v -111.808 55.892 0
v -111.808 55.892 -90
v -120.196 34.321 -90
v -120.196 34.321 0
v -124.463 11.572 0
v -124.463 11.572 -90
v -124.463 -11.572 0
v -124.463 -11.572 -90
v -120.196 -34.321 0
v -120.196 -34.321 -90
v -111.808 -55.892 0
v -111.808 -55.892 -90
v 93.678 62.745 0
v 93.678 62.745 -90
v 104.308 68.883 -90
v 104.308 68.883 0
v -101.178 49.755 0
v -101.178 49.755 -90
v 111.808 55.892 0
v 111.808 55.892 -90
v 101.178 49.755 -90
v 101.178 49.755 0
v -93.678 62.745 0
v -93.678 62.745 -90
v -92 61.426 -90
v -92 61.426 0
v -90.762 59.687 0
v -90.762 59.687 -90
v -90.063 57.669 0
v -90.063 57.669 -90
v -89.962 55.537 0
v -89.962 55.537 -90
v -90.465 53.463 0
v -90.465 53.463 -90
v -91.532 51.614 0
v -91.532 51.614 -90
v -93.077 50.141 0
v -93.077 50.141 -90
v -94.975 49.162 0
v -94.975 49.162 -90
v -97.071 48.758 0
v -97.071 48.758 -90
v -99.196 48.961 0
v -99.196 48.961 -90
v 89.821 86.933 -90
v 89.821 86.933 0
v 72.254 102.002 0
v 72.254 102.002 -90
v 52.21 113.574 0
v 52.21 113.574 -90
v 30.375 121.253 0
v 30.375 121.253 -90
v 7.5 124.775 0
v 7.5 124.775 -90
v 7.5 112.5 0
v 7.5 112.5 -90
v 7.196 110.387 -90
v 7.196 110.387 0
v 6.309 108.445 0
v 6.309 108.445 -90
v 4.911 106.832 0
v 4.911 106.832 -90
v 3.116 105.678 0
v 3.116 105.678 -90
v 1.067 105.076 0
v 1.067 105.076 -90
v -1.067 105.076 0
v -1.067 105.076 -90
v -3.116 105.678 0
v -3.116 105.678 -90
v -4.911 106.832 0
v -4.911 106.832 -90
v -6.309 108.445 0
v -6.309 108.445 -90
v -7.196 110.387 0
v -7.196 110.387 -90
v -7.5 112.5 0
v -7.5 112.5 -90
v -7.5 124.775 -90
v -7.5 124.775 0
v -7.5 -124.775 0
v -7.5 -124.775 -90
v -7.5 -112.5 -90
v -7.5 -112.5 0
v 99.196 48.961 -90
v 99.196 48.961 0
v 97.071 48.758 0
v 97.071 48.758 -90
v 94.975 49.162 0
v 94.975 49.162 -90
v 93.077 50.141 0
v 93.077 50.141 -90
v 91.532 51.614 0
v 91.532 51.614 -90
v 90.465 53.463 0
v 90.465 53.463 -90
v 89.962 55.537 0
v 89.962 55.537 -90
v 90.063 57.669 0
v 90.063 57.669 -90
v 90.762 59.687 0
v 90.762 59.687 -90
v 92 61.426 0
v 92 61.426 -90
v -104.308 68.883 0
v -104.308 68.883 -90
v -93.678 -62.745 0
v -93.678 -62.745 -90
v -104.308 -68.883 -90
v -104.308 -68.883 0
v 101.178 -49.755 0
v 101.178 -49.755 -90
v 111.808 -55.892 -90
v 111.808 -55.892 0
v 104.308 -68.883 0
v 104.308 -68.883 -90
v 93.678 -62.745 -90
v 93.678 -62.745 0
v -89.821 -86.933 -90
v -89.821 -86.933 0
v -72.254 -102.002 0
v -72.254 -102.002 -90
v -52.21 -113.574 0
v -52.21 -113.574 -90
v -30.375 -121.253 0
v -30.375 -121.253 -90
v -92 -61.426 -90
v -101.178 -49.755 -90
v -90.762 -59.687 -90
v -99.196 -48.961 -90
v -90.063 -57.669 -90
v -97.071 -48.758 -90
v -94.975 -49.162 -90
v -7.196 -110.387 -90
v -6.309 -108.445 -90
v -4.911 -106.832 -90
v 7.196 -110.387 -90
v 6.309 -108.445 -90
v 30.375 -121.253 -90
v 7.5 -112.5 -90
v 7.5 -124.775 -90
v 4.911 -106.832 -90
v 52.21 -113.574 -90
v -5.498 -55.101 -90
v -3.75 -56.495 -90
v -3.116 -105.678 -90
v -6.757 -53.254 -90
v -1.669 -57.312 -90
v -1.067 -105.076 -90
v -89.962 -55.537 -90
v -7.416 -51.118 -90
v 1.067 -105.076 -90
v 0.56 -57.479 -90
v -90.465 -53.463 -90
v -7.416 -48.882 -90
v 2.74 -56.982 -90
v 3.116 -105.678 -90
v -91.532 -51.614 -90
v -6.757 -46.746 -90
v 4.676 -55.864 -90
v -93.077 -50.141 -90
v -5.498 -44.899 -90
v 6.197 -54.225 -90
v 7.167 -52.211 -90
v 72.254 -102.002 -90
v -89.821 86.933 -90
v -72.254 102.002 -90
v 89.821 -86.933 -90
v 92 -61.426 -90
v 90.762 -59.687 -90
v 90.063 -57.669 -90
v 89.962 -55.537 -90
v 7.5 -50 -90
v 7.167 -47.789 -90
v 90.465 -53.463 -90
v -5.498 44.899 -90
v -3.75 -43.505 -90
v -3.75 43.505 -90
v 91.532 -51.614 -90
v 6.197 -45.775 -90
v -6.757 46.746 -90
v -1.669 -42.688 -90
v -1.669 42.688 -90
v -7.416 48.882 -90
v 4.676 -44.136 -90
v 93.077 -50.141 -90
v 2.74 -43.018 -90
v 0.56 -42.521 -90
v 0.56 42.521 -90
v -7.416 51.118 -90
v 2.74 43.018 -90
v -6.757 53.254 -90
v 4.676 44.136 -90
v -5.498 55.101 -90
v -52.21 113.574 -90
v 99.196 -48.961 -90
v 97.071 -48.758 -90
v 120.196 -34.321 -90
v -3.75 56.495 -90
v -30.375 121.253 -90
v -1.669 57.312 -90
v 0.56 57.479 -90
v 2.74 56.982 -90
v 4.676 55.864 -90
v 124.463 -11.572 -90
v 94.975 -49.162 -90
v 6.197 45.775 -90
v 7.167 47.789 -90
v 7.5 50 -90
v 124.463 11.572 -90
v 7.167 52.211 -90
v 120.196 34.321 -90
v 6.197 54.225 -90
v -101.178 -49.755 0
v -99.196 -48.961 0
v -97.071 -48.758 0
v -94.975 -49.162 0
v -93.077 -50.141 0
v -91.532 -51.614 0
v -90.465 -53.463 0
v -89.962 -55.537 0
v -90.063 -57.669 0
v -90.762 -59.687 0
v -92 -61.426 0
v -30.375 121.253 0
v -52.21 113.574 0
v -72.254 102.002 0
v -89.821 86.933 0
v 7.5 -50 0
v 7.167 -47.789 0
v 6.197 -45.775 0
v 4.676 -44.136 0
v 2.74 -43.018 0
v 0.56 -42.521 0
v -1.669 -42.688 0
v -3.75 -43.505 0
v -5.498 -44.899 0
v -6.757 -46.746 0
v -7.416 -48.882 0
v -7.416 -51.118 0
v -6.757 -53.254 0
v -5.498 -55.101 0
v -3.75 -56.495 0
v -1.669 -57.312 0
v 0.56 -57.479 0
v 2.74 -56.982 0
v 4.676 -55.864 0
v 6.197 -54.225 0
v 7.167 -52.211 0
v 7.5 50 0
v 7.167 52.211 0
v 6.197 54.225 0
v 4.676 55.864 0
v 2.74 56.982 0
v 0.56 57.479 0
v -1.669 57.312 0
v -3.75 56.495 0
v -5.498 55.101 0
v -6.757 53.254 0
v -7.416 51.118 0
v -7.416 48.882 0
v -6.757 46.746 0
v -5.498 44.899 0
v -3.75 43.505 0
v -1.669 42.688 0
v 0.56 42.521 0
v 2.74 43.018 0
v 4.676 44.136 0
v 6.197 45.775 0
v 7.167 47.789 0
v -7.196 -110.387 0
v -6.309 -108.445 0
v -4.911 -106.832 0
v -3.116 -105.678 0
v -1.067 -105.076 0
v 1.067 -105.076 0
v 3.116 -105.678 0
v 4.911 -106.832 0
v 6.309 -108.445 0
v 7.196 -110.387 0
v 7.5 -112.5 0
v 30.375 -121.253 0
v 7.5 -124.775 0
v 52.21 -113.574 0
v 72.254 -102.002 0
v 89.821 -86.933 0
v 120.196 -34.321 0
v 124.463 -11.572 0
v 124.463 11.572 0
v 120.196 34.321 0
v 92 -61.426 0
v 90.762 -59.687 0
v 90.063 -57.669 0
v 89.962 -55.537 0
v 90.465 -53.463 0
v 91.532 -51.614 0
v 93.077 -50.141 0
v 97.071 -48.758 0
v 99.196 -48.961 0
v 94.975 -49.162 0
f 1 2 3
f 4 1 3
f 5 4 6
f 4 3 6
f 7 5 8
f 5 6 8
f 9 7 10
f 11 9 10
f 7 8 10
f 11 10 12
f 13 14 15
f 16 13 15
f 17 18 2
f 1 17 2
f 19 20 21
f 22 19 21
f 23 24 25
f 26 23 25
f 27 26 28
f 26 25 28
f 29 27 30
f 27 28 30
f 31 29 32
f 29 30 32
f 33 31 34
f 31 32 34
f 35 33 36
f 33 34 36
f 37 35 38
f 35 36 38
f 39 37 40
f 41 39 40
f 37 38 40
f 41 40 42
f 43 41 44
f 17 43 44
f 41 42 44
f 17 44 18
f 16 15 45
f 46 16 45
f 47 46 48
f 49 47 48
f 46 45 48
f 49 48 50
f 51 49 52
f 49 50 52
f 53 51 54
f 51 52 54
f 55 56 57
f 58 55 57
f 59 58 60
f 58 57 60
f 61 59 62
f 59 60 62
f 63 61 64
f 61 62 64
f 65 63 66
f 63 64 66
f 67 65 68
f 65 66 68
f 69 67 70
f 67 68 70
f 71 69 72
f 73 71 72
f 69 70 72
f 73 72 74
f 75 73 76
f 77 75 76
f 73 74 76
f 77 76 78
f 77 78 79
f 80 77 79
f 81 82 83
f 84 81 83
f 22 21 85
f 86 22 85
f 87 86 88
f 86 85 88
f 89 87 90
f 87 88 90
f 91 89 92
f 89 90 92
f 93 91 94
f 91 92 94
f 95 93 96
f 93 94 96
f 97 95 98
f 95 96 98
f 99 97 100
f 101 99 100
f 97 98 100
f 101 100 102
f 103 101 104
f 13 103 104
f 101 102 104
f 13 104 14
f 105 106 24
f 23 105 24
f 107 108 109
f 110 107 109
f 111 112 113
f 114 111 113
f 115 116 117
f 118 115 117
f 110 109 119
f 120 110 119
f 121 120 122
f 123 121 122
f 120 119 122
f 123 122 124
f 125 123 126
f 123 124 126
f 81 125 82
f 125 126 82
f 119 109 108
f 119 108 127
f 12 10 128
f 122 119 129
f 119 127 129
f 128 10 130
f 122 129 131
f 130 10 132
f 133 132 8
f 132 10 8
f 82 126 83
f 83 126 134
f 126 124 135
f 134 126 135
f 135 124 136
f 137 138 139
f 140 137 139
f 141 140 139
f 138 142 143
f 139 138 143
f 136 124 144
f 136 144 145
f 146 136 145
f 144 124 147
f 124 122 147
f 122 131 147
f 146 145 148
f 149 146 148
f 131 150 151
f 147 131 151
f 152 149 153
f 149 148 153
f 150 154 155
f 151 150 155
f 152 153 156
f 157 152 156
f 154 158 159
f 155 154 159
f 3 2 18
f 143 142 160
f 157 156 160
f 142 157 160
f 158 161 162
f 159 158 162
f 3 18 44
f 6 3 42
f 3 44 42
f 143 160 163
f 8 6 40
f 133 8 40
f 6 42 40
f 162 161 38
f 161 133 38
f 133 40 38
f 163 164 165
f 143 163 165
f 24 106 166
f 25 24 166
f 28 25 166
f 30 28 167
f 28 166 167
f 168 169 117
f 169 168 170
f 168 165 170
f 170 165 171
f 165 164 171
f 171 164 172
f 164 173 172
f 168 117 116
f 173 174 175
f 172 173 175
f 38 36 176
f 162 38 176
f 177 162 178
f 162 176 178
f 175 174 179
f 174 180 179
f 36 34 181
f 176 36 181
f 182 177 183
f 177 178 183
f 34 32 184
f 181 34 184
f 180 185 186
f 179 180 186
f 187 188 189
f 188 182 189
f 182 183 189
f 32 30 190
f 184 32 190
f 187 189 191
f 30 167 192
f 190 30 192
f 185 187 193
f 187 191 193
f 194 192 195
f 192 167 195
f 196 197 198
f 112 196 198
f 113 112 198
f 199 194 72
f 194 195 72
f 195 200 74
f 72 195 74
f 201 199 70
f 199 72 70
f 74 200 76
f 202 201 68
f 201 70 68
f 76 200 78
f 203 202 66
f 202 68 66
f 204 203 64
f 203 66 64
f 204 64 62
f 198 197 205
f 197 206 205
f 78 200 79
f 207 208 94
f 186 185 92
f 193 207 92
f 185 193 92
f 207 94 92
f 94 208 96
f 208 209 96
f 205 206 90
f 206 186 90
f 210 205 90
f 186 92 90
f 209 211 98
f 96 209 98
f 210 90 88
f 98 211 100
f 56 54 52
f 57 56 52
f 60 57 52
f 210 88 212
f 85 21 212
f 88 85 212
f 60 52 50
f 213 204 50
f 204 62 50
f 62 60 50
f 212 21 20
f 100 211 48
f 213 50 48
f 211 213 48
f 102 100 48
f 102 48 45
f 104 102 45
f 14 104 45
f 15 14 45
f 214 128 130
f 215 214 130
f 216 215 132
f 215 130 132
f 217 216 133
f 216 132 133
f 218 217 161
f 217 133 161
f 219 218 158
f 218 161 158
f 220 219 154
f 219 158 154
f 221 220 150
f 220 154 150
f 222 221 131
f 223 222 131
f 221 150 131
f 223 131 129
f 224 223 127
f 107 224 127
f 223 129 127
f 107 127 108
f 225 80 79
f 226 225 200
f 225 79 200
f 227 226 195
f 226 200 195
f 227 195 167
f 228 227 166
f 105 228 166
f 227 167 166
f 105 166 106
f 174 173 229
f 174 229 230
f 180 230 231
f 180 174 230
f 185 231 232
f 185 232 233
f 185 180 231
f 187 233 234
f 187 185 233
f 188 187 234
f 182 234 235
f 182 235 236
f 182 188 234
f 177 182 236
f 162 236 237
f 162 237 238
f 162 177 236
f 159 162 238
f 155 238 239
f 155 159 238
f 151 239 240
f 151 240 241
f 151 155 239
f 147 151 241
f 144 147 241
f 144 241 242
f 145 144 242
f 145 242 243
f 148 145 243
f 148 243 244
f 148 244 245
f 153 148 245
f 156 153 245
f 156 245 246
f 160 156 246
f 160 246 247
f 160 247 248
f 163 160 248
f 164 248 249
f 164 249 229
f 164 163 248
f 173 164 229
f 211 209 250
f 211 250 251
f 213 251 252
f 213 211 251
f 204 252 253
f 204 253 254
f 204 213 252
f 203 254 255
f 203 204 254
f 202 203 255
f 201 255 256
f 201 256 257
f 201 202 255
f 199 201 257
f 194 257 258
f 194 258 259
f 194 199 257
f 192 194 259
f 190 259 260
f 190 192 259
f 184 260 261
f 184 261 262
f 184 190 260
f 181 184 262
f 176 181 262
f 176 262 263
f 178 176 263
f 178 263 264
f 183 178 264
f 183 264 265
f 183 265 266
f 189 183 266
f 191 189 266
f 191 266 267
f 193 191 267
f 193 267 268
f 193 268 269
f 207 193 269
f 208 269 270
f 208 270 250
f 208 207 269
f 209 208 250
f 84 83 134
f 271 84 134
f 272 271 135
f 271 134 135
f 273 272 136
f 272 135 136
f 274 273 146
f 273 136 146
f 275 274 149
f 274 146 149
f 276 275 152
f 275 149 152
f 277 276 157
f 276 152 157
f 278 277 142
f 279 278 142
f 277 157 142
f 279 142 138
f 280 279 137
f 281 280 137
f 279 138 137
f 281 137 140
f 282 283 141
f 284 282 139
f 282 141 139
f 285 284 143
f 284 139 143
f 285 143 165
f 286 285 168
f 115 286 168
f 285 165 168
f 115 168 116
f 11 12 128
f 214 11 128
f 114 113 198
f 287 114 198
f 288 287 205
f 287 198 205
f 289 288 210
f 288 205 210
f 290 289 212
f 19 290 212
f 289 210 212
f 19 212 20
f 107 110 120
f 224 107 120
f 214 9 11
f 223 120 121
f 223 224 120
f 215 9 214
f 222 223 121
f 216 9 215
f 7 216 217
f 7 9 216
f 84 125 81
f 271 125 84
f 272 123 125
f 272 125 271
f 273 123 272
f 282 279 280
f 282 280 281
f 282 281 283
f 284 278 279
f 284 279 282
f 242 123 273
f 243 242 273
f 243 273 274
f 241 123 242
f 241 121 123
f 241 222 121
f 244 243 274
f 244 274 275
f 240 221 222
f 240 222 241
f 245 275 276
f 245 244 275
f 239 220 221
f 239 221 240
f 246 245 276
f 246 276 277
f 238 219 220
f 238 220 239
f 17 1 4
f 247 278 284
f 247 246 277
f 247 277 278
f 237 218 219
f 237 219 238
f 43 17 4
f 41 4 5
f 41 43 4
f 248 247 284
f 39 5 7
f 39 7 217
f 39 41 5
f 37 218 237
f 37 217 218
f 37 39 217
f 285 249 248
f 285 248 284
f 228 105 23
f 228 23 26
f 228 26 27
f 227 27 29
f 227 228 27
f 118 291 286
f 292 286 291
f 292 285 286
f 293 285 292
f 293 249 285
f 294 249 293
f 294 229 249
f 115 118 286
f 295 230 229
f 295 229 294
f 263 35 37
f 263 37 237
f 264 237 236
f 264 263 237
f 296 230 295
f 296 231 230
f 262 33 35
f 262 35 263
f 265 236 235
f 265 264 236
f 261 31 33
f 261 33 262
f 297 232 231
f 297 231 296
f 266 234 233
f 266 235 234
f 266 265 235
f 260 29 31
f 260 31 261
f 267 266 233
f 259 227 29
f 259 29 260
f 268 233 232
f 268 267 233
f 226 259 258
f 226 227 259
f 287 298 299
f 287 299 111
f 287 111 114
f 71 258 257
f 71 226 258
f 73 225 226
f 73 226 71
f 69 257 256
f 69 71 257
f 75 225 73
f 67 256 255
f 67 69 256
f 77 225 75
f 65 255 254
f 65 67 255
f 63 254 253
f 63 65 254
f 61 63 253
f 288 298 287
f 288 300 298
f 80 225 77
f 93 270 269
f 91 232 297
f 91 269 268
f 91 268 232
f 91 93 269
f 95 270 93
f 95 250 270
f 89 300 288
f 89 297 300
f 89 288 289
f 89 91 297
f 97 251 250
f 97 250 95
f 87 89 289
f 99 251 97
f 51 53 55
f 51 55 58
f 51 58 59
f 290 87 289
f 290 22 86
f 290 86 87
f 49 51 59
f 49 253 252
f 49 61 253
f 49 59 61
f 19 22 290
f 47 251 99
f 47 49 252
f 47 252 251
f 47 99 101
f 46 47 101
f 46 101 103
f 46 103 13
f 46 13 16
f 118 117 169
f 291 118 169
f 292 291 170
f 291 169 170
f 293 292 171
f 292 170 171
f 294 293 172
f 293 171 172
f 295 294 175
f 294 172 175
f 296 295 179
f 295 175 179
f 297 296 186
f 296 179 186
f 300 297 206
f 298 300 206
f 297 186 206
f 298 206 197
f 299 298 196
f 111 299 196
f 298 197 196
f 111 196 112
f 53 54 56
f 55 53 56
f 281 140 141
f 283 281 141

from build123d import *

# Parameters (mm, degrees)
F0_R     = 7.5
F1_DEPTH = 90


with BuildPart() as f1:
    # F0 (on Top) → F1 (new body)
    with BuildSketch(Plane.XY):
        with BuildLine():
            Line((-7.5, 112.5), (-7.5, 124.774797))
            ThreePointArc((-7.5, 124.774797), (-62.5, 108.253175), (-104.308144, 68.882589))
            Line((-104.308144, 68.882589), (-93.677858, 62.745191))
            ThreePointArc((-93.677858, 62.745191), (-90.932667, 52.5), (-101.177858, 49.754809))
            Line((-101.177858, 49.754809), (-111.808144, 55.892208))
            ThreePointArc((-111.808144, 55.892208), (-125, 0), (-111.808144, -55.892208))
            Line((-111.808144, -55.892208), (-101.177858, -49.754809))
            ThreePointArc((-101.177858, -49.754809), (-90.932667, -52.5), (-93.677858, -62.745191))
            Line((-93.677858, -62.745191), (-104.308144, -68.882589))
            ThreePointArc((-104.308144, -68.882589), (-62.5, -108.253175), (-7.5, -124.774797))
            Line((-7.5, -124.774797), (-7.5, -112.5))
            ThreePointArc((-7.5, -112.5), (0, -105), (7.5, -112.5))
            Line((7.5, -112.5), (7.5, -124.774797))
            ThreePointArc((7.5, -124.774797), (62.5, -108.253175), (104.308144, -68.882589))
            Line((104.308144, -68.882589), (93.677858, -62.745191))
            ThreePointArc((93.677858, -62.745191), (90.932667, -52.5), (101.177858, -49.754809))
            Line((101.177858, -49.754809), (111.808144, -55.892208))
            ThreePointArc((111.808144, -55.892208), (125, 0), (111.808144, 55.892208))
            Line((111.808144, 55.892208), (101.177858, 49.754809))
            ThreePointArc((101.177858, 49.754809), (90.932667, 52.5), (93.677858, 62.745191))
            Line((93.677858, 62.745191), (104.308144, 68.882589))
            ThreePointArc((104.308144, 68.882589), (62.5, 108.253175), (7.5, 124.774797))
            Line((7.5, 124.774797), (7.5, 112.5))
            ThreePointArc((7.5, 112.5), (0, 105), (-7.5, 112.5))
        make_face()
        with Locations((0, -50)):
            Circle(F0_R, mode=Mode.SUBTRACT)
        with Locations((0, 50)):
            Circle(F0_R, mode=Mode.SUBTRACT)
    extrude(amount=F1_DEPTH)


with BuildPart() as f1_1:
    # F2: moved
    add(f1.part.moved(Location((0, 0, -90))))


solid = f1_1.part
